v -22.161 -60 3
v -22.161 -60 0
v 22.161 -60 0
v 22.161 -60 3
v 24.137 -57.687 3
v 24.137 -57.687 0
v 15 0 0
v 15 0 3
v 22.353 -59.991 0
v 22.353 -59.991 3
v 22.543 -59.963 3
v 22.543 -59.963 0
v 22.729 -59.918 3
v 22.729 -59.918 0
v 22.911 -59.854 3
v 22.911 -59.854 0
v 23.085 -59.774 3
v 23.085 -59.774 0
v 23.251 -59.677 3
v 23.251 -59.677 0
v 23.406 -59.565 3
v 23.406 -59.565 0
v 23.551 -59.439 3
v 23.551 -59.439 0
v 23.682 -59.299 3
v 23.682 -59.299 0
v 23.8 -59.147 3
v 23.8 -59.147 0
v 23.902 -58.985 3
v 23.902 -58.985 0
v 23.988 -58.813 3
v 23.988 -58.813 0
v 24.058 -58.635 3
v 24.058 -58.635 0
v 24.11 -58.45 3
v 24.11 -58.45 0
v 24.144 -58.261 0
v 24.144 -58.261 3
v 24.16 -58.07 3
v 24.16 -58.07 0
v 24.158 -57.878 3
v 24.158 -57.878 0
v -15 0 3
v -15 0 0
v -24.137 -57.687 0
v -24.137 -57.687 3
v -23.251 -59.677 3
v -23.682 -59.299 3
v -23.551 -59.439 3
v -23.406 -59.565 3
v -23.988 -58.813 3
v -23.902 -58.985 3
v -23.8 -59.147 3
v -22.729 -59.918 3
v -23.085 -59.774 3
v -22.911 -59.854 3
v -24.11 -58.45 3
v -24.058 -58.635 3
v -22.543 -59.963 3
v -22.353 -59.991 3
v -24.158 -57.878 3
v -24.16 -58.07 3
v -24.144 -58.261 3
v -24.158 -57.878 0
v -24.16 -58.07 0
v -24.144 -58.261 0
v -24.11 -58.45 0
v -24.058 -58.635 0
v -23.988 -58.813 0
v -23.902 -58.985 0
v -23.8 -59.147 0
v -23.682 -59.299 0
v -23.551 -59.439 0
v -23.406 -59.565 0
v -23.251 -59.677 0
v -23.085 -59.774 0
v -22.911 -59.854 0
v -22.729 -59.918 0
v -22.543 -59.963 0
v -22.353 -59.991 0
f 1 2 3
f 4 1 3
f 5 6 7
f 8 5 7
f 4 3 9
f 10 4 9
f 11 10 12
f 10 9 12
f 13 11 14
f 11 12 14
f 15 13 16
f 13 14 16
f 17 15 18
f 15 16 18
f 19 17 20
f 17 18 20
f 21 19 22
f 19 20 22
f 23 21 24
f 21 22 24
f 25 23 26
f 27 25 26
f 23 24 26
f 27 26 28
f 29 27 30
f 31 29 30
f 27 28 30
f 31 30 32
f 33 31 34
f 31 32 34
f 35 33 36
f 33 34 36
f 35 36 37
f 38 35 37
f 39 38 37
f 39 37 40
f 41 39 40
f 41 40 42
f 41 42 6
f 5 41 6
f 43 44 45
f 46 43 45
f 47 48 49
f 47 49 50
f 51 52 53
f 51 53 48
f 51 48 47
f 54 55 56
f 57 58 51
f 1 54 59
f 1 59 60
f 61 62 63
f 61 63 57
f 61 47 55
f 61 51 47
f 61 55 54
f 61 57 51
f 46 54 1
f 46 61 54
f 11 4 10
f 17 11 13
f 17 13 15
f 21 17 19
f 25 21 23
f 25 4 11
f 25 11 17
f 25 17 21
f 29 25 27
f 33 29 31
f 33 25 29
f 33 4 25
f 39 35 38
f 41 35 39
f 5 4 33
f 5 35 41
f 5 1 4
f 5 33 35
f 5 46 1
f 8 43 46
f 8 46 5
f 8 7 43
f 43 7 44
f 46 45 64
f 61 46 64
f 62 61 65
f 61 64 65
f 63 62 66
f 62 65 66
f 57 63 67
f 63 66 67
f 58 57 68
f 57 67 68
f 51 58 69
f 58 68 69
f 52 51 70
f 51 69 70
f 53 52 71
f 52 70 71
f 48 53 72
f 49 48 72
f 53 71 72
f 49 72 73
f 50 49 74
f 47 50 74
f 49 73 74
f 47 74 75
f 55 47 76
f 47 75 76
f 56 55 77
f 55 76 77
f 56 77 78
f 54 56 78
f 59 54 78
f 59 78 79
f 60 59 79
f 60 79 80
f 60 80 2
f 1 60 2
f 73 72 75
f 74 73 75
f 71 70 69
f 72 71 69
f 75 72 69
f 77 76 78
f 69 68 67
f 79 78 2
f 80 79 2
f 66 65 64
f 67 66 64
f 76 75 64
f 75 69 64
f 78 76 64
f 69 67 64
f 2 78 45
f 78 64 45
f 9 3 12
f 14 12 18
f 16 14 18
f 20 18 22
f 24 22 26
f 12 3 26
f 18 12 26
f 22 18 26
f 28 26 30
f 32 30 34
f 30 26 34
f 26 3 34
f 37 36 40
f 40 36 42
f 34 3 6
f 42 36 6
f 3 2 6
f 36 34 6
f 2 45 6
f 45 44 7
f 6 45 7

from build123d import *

# Parameters (mm, degrees)
F1_DEPTH = 3


with BuildPart() as f1:
    # F0 (on Top) → F1 (new body)
    with BuildSketch(Plane.XY):
        with BuildLine():
            Line((15, 0), (0, 0))
            Line((0, 0), (-15, 0))
            Line((-15, 0), (-24.136744, -57.687131))
            ThreePointArc((-24.136744, -57.687131), (-23.682179, -59.298896), (-22.161367, -60))
            Line((-22.161367, -60), (0, -60))
            Line((0, -60), (22.161367, -60))
            ThreePointArc((22.161367, -60), (23.682179, -59.298896), (24.136744, -57.687131))
            Line((24.136744, -57.687131), (15, 0))
        make_face()
    extrude(amount=F1_DEPTH)


solid = f1.part
